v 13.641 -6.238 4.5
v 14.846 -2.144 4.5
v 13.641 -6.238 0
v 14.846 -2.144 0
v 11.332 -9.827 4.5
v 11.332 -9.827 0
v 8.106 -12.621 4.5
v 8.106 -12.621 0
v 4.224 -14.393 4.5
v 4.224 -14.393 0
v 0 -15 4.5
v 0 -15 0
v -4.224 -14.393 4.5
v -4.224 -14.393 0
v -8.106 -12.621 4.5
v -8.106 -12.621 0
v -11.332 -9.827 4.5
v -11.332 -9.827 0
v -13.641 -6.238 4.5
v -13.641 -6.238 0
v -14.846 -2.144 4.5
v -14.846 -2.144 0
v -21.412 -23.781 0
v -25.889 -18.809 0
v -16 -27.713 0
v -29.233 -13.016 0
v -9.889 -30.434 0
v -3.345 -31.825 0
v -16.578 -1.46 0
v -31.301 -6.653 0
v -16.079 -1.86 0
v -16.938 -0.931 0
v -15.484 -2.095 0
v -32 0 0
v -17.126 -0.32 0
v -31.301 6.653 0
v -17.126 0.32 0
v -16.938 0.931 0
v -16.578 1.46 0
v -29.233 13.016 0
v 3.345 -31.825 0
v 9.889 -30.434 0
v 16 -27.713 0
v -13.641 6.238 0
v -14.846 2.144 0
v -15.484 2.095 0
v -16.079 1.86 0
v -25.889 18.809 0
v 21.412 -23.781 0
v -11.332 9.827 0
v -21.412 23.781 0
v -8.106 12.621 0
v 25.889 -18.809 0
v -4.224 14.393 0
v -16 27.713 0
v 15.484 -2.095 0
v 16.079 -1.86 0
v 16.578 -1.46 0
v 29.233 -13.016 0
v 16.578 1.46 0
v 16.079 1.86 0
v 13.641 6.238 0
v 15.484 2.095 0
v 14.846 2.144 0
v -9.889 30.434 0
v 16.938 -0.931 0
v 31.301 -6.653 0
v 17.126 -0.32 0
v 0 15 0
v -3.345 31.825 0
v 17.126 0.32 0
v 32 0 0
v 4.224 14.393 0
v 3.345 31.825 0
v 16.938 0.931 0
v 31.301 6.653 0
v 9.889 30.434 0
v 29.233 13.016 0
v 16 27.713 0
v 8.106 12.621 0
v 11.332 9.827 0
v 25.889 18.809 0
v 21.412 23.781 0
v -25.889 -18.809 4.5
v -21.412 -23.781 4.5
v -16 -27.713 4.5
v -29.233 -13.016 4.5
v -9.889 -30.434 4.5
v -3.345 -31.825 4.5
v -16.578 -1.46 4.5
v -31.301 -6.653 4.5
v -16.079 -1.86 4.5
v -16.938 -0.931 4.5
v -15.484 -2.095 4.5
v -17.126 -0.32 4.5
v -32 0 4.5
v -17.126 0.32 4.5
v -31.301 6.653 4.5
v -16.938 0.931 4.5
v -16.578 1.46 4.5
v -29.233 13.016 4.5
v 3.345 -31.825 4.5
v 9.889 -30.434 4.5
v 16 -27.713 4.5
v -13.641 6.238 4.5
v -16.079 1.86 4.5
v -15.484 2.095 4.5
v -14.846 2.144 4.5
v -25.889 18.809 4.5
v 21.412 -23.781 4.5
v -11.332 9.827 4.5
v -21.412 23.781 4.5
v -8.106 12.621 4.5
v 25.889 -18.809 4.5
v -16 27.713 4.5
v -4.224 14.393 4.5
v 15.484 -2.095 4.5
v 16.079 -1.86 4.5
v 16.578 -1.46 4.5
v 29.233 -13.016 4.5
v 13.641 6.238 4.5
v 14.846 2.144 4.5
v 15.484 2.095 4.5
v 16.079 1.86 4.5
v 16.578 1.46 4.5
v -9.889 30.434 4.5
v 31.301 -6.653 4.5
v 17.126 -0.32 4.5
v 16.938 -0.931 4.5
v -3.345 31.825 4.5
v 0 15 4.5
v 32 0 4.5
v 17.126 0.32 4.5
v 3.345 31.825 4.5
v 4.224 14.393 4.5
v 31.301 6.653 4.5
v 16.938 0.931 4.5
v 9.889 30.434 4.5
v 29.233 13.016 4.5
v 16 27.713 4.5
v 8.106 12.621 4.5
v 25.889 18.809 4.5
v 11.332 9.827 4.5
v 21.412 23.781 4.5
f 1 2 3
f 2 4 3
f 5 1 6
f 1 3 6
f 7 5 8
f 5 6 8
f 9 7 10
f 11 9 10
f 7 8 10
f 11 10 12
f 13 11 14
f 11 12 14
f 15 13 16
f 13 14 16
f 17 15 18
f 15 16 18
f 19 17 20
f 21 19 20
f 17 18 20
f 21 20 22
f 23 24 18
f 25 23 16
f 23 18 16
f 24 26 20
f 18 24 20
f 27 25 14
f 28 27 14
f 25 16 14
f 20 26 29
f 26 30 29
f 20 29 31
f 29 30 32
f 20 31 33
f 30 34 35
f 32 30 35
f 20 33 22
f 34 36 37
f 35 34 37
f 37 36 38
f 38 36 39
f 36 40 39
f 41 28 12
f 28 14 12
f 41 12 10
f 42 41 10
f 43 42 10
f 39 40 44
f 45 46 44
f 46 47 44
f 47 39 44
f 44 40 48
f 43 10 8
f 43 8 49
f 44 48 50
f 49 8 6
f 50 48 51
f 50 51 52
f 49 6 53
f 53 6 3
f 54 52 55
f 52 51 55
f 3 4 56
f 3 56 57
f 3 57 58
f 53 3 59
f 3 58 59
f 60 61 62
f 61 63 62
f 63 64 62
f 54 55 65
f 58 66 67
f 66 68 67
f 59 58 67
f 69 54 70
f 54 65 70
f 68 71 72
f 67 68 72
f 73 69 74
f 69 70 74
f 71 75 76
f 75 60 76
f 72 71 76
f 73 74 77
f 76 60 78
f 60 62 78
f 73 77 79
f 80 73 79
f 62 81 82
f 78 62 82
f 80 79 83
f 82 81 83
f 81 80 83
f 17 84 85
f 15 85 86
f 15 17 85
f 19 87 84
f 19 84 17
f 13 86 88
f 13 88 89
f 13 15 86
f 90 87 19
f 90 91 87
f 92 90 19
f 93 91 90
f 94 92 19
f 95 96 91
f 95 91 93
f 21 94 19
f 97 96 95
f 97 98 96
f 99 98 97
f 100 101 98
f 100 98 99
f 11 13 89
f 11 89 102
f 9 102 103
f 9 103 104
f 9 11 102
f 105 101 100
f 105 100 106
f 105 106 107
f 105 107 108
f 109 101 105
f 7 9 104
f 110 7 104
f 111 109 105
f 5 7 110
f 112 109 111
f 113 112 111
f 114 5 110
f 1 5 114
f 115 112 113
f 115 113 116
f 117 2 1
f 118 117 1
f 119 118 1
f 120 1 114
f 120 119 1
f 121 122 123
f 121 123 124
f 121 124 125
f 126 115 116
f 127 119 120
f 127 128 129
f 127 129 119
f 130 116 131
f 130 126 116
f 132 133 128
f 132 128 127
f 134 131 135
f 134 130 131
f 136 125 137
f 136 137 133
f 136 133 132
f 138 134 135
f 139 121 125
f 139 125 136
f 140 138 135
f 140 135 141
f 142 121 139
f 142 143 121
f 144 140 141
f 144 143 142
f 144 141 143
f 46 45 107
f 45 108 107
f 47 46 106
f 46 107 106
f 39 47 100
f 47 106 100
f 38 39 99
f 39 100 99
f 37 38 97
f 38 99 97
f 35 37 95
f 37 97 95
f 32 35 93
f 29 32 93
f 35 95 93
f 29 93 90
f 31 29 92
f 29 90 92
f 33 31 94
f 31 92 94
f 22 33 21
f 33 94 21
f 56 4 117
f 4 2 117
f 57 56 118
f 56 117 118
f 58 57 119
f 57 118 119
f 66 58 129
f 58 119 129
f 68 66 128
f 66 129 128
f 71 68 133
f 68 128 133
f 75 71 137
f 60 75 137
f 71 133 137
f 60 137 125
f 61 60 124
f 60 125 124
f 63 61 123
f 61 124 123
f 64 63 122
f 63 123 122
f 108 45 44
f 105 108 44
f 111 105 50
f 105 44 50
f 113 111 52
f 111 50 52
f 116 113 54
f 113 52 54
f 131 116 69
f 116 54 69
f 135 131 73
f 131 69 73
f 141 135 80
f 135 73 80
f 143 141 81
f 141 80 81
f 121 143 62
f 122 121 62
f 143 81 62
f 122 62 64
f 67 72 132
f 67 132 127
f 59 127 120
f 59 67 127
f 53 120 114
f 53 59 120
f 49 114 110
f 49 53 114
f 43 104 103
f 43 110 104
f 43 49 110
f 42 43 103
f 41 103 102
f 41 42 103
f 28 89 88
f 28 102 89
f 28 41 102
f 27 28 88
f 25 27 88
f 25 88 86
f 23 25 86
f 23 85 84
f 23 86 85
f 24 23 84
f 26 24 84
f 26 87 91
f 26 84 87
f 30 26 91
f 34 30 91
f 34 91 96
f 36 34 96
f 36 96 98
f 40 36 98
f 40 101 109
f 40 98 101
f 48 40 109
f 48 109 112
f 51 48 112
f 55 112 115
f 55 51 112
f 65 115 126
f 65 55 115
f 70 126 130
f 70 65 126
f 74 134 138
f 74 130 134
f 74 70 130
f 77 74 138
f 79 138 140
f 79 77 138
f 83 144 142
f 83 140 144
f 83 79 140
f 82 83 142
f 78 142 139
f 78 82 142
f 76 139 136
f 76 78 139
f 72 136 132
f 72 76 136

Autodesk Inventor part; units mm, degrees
ref_plane "YZ Plane" through (0, 0, 0) normal (1, 0, 0) x (0, 1, 0)
ref_plane "XZ Plane" through (0, 0, 0) normal (0, 1, 0) x (-1, 0, 0)
ref_plane "XY Plane" through (0, 0, 0) normal (0, 0, 1) x (1, 0, 0)
sketch "草圖1" plane through (0, 0, 0) normal (0, 0, 1) x (1, 0, 0)
  circle A0 centre (0, 0) radius 32
  dimension "d0" = 64
extrude "擠出1" add sketch "草圖1" along normal blind 4.5
sketch "草圖2" plane through (0, 0, 4.5) normal (0, 0, 1) x (1, 0, 0)
  point P0 (0, 0)
  point P1 (0, 0)
hole "孔1" at (0, 0, 4.5) direction (0, 0, -1) diameter 30 end through all
sketch "草圖3" plane through (0, 0, 4.5) normal (0, 0, 1) x (1, 0, 0)
  circle A0 centre (15, 0) radius 2.15
  point P0 (0, 0)
  dimension "d10" = 0
  dimension "d11" = 4.3
  dimension "d12" = 15
extrude "擠出2" cut sketch "草圖3" against normal blind 20
pattern_circular "環形陣列1" count 2 over 360 about axis through (0, 0, -86.1215) along (0, 0, 1) of "擠出2"
properties part number "銅墊塊-50T"
